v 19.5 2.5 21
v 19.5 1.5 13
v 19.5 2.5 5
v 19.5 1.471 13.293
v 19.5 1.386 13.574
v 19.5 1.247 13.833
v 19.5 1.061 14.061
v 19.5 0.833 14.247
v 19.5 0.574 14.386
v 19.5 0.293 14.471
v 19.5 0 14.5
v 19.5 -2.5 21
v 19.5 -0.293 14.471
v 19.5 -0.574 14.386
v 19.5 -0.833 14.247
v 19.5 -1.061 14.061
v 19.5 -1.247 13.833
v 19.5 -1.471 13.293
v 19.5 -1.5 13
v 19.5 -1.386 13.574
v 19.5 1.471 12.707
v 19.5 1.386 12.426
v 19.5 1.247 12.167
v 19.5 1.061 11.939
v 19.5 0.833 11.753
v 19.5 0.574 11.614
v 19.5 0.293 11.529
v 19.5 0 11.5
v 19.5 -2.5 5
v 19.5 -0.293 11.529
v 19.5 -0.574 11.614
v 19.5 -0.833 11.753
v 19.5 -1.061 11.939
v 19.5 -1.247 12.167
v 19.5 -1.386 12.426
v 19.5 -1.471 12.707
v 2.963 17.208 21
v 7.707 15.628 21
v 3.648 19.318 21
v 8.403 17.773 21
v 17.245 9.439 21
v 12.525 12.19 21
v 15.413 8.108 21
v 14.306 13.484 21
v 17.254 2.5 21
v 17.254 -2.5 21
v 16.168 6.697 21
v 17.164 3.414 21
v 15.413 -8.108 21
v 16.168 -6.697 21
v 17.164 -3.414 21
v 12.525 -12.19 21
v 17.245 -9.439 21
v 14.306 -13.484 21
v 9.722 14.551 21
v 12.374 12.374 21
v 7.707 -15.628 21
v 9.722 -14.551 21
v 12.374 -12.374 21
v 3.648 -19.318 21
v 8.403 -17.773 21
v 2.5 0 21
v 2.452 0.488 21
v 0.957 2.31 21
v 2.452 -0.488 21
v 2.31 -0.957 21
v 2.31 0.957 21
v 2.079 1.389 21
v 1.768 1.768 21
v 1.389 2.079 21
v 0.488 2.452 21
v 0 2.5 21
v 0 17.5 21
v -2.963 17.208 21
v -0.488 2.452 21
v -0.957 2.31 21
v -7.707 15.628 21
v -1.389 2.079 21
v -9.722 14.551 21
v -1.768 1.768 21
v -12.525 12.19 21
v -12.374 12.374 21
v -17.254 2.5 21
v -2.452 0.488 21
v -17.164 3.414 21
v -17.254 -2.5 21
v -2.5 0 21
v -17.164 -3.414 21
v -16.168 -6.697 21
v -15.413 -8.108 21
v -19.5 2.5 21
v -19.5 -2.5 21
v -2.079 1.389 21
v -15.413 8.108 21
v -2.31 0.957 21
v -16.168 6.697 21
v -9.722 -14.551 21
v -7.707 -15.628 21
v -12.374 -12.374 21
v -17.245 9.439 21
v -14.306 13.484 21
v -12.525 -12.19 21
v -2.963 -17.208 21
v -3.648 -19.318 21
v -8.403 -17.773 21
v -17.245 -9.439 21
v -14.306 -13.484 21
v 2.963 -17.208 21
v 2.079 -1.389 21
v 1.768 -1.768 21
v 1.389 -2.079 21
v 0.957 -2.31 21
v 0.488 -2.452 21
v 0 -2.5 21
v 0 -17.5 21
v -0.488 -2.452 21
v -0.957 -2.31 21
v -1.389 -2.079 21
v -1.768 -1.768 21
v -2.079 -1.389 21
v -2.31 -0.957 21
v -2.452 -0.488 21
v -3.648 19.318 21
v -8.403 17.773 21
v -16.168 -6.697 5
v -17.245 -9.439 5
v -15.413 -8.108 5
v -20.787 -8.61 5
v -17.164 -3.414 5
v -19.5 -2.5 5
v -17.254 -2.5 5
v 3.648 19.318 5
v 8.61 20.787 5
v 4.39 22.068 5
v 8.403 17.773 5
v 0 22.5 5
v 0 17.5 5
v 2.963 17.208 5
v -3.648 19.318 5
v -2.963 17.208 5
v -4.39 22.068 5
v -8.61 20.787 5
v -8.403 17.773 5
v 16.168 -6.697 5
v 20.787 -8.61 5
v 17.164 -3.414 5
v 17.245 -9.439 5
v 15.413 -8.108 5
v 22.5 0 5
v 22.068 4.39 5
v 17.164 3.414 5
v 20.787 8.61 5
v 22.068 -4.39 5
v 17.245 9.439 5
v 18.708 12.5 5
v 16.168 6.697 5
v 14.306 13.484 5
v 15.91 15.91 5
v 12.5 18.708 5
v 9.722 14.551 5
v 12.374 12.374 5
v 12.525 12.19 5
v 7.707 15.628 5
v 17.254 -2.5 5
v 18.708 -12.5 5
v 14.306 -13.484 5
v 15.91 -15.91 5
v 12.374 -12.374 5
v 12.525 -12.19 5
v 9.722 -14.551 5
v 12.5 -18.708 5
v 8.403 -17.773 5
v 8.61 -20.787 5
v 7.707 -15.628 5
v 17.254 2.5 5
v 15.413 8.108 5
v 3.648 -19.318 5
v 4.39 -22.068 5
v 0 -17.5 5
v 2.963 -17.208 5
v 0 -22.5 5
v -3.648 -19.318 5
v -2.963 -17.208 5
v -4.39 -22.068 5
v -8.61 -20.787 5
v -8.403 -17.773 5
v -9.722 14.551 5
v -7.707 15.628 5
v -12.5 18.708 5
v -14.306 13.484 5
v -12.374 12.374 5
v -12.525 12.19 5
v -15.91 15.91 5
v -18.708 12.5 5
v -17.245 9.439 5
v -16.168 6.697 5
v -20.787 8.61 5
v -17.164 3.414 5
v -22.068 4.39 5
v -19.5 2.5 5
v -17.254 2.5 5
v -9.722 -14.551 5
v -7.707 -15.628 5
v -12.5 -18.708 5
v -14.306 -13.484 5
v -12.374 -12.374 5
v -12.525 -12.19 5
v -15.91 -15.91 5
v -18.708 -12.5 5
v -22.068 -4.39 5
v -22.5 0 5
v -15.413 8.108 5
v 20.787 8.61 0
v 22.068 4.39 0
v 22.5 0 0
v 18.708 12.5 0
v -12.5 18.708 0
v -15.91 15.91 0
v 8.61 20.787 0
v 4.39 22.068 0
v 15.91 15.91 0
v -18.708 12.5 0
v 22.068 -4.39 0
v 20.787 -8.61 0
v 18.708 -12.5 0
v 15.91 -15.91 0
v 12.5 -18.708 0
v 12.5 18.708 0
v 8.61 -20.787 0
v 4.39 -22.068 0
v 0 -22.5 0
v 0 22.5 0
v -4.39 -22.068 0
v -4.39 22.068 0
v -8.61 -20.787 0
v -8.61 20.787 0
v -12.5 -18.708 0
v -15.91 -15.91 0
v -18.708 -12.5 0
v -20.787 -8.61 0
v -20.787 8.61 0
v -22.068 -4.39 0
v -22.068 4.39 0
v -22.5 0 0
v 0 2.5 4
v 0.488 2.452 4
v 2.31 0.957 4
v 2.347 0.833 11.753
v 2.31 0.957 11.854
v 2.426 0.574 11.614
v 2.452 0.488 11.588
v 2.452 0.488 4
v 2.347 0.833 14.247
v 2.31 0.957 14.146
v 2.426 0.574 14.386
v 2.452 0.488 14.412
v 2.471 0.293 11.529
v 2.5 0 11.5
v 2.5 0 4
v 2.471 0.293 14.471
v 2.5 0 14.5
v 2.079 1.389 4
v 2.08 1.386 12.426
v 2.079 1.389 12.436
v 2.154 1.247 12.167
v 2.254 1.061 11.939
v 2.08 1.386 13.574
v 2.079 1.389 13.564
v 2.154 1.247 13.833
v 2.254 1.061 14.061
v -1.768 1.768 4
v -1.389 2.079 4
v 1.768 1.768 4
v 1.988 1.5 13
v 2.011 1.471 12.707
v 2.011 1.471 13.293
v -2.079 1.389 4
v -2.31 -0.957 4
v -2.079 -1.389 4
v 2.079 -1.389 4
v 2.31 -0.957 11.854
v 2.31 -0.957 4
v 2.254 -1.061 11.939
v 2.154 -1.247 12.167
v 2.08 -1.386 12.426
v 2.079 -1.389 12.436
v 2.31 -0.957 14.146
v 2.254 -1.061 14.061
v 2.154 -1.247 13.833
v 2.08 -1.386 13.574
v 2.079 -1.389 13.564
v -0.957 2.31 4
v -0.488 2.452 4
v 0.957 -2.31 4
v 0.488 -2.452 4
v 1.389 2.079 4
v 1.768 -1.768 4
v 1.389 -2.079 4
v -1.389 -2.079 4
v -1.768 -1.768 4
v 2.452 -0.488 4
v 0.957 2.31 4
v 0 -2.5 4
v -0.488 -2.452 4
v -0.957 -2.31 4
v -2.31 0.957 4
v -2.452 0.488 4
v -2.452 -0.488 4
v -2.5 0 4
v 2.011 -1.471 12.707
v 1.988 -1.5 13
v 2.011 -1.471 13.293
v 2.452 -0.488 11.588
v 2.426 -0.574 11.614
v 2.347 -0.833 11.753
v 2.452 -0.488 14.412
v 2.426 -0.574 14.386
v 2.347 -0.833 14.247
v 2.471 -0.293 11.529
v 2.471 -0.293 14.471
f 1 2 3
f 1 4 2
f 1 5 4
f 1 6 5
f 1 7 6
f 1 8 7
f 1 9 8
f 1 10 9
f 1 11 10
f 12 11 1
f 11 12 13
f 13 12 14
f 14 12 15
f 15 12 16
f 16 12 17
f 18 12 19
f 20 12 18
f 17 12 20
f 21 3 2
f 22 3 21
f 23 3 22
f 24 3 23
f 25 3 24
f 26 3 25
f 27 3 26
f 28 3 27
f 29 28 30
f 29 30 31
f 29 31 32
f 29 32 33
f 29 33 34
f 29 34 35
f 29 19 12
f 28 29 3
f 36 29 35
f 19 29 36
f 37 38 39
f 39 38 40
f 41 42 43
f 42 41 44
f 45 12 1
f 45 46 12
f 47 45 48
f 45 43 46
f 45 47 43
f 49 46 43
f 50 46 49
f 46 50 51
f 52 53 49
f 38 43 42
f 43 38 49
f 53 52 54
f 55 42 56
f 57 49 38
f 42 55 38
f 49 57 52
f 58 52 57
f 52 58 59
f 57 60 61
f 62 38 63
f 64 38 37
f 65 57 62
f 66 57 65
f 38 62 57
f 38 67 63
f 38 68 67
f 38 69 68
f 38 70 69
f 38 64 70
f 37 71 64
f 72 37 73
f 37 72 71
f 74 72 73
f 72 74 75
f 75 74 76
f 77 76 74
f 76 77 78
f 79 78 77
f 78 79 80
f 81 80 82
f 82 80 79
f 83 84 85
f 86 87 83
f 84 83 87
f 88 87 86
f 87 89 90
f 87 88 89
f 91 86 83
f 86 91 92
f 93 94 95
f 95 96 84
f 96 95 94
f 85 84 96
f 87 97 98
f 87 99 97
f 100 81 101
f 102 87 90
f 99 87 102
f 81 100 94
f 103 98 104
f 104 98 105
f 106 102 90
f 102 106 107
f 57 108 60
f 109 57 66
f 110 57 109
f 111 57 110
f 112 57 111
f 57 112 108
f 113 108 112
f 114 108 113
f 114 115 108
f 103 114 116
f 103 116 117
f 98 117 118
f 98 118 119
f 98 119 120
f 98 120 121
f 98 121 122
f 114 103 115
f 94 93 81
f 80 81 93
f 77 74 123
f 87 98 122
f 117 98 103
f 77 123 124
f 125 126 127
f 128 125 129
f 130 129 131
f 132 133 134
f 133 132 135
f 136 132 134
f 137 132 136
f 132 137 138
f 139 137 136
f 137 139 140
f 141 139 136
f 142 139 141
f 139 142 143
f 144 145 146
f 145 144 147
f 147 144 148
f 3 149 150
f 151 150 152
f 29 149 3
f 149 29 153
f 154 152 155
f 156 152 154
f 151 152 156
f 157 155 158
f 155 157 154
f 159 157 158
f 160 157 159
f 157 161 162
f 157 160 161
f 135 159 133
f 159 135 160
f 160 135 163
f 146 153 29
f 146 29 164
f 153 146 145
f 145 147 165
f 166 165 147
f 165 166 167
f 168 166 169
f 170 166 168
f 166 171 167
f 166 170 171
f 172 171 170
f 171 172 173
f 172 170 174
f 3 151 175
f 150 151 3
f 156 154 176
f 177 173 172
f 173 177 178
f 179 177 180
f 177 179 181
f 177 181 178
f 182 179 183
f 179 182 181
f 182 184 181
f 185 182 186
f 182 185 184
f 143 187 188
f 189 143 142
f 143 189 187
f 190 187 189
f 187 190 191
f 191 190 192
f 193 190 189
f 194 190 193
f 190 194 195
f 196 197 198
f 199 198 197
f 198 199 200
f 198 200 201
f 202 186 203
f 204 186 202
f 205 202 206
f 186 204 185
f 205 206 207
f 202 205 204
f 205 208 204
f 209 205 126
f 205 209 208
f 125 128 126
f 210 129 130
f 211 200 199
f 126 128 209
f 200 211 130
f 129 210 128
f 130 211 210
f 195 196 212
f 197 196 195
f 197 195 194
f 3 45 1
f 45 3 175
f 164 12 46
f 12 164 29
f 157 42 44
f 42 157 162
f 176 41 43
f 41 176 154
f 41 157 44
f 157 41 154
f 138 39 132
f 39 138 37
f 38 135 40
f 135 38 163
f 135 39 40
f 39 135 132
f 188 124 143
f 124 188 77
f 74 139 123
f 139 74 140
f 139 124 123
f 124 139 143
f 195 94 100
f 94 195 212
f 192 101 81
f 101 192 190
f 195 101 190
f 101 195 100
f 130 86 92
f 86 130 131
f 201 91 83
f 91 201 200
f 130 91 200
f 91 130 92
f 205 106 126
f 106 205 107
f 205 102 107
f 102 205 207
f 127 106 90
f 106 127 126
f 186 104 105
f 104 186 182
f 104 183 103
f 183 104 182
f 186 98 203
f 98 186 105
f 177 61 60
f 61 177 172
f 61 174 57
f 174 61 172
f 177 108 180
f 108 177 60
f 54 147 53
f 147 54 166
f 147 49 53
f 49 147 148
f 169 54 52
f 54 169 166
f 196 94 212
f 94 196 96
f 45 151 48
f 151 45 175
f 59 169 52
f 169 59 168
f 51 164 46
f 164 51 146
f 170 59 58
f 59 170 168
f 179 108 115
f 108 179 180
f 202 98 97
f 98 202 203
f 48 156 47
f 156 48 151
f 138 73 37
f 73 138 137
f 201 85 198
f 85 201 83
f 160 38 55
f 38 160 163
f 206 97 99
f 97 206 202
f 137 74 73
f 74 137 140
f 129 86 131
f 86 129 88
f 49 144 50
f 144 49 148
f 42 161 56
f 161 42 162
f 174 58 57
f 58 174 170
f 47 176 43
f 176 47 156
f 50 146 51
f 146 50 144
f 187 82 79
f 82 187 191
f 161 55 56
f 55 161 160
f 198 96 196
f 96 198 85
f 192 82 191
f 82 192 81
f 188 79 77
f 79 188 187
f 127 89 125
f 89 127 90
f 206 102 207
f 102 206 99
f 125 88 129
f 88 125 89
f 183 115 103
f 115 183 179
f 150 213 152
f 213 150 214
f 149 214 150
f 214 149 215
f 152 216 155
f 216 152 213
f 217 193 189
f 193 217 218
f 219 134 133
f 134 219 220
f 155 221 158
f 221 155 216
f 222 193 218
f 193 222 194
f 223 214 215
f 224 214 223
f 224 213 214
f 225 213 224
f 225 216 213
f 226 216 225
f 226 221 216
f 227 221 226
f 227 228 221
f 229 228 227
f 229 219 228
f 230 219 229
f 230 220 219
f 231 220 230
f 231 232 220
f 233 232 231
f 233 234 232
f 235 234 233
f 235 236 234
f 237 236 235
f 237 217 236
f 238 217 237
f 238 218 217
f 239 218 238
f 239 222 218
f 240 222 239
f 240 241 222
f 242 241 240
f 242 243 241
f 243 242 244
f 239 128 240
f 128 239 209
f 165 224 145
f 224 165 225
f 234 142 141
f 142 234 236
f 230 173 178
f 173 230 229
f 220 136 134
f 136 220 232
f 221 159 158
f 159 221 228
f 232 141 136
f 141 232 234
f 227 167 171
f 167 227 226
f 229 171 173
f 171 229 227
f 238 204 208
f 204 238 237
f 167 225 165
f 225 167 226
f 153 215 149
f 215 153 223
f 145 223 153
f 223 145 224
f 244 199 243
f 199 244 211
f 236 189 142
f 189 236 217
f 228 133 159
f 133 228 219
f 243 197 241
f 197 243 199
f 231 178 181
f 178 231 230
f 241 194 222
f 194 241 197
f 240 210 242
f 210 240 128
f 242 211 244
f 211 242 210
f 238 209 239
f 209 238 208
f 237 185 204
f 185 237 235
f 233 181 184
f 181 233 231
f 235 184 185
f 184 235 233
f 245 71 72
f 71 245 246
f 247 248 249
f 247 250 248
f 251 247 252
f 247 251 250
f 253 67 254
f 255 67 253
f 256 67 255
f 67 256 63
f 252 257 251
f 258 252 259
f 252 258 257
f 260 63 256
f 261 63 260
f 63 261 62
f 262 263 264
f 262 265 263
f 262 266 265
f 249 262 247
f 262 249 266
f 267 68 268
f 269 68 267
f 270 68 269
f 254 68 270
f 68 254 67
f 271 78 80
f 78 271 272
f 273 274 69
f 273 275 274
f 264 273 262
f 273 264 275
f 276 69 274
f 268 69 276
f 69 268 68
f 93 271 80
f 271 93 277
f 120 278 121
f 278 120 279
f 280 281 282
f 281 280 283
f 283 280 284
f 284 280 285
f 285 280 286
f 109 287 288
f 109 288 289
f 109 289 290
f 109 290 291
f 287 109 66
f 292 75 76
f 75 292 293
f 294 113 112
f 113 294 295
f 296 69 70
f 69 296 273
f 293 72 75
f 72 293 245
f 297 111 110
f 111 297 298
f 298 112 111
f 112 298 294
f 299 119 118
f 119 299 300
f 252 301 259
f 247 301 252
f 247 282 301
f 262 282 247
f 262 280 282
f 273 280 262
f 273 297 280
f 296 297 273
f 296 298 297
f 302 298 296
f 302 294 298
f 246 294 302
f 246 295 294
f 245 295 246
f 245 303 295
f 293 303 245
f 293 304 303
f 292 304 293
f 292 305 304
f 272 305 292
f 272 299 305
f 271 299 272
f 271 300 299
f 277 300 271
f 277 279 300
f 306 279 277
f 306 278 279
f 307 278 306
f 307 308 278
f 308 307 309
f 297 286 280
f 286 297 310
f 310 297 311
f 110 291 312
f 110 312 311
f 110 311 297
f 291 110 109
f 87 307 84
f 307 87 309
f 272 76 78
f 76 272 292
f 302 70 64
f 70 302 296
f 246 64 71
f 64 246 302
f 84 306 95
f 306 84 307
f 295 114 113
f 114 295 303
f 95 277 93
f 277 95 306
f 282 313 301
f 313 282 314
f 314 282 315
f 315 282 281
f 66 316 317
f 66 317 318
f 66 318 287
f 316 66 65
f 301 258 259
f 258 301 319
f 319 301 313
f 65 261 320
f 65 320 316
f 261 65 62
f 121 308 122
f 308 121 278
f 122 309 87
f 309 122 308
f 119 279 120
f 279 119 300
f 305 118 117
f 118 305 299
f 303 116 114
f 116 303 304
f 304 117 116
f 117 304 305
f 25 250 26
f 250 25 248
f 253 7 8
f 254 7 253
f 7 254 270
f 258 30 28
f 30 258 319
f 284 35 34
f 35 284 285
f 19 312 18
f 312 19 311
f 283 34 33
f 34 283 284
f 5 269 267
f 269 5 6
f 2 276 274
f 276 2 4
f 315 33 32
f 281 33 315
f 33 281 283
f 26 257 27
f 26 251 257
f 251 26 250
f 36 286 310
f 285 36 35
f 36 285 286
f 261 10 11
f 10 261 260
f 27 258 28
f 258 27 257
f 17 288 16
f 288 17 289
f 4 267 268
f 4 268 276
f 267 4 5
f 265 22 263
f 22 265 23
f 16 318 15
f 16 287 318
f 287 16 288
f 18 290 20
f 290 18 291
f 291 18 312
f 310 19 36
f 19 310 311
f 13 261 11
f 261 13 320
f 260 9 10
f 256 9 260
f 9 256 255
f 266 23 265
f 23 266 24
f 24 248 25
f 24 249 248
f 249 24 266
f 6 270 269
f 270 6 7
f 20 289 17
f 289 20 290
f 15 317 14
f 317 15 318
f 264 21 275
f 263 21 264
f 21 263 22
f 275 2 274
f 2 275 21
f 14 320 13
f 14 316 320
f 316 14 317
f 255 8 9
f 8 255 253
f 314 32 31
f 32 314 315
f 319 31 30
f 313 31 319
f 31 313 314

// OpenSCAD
$fn = 32;

// ----------------------------------------------------------------------
// Control knob: skirt knob with grip ribs
// ----------------------------------------------------------------------

// --- parameters (mm) ---
skirt_d = 45;             // skirt diameter
skirt_t = 5;              // skirt thickness
rib_w = 5;                // grip rib width
rib_out = 3;              // grip rib radial protrusion
n_ribs = 10;              // number of grip ribs
knob_d = 35;              // knob body diameter
knob_h = 16;              // knob body height
bore_d = 5;               // shaft bore diameter
set_d = 3;                // set screw bore diameter

rib_step = 360 / n_ribs;  // rib angular step
total_h = skirt_t + knob_h;  // overall height

difference() {
  union() {
    translate([0, 0, skirt_t]) cylinder(h = knob_h, d = knob_d);
    cylinder(h = skirt_t, d = skirt_d);
    for (i = [0 : n_ribs - 1])
      rotate([0, 0, i * rib_step])
        translate([knob_d / 2 - 1, -rib_w / 2, skirt_t])
          cube([rib_out, rib_w, knob_h]);
  }
  translate([0, 0, skirt_t - 1]) cylinder(h = knob_h + 2, d = bore_d);
  translate([-1, 0, skirt_t + knob_h / 2]) rotate([0, 90, 0])
    cylinder(h = knob_d / 2 + bore_d / 2 + 2, d = set_d);
}
